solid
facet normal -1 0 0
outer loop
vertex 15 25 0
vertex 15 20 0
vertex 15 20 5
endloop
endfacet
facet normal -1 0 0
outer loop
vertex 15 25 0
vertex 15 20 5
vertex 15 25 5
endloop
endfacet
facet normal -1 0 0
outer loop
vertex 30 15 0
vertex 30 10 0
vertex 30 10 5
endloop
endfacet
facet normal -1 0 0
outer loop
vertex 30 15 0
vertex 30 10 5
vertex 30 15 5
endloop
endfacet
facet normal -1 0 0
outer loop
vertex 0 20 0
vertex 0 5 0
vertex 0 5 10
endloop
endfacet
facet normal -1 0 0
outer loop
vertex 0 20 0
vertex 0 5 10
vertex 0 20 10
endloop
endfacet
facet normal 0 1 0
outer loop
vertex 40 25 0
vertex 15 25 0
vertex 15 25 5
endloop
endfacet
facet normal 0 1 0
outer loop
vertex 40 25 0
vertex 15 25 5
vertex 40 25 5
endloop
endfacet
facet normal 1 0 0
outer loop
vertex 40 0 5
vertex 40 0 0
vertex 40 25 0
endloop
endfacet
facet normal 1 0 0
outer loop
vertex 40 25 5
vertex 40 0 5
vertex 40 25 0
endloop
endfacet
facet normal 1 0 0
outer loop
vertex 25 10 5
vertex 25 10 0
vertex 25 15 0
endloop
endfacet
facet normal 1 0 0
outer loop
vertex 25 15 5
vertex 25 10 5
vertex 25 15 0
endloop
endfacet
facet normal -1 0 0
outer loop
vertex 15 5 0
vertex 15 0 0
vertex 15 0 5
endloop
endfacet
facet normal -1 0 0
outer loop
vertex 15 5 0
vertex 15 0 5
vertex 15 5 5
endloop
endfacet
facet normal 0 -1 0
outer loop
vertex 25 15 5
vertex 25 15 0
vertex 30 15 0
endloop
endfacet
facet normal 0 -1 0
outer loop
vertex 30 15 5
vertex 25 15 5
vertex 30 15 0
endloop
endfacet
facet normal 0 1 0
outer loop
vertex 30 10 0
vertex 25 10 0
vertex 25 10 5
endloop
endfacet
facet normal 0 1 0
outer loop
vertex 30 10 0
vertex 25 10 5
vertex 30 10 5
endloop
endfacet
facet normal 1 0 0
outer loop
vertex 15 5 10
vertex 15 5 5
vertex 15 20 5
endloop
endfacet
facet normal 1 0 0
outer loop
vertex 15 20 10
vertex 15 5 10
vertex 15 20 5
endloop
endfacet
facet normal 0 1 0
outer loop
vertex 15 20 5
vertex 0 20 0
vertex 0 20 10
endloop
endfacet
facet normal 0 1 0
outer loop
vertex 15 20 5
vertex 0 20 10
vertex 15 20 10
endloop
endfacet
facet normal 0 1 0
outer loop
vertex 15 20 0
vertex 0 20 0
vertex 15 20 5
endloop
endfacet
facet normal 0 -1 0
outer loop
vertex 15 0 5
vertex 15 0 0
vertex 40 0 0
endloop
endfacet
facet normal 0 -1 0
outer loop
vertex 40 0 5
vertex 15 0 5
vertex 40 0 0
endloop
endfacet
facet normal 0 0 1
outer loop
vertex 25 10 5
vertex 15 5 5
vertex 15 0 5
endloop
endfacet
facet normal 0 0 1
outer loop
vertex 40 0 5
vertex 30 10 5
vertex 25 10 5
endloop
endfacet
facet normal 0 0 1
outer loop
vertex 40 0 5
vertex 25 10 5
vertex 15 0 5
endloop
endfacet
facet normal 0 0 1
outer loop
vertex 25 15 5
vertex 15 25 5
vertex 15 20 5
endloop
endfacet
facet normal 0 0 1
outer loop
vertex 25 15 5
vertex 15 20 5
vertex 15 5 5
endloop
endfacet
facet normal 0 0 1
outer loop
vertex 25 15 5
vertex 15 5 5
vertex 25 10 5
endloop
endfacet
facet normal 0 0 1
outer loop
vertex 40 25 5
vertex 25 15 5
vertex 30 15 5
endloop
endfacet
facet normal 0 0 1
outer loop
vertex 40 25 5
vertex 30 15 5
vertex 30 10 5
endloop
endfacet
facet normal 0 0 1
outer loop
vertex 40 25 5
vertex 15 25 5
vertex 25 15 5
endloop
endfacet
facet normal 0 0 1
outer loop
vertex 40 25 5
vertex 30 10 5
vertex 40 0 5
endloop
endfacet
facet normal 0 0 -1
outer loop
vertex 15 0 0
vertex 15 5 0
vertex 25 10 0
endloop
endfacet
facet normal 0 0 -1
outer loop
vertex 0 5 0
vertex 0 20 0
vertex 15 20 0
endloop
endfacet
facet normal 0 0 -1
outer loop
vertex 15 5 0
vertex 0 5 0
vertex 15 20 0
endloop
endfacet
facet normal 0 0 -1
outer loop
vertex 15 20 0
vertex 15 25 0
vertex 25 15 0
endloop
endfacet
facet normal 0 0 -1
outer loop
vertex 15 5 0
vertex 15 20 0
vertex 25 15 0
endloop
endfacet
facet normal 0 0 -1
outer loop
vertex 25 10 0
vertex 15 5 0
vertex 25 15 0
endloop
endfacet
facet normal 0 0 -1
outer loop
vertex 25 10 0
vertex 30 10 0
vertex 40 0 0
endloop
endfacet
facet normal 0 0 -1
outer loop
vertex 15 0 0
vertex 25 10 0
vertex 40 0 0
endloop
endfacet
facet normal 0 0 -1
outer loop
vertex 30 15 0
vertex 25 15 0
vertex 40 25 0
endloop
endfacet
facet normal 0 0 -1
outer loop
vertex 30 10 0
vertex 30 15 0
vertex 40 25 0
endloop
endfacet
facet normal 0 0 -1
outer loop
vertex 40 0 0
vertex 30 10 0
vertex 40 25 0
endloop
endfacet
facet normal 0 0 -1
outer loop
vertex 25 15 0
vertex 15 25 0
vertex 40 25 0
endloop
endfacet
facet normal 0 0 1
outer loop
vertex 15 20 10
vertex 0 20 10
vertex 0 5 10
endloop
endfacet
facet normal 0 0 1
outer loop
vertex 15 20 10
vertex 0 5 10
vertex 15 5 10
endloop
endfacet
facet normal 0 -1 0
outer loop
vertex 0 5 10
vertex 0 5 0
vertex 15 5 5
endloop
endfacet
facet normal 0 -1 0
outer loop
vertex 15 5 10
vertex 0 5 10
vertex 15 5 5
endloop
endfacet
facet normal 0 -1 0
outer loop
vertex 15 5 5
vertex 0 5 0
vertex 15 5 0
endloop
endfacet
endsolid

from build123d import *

# Parameters (mm, degrees)
BOX002_W     = 5
BOX002_H     = 5
BOX002_DEPTH = 10
BOX001_W     = 25
BOX001_H     = 25
BOX001_DEPTH = 5
BOX_W        = 15
BOX_H        = 15
BOX_DEPTH    = 10


with BuildPart() as cube002:
    # Box002 → Box002 (new body)
    with BuildSketch(Plane(origin=(25, 10, 0), x_dir=(1, 0, 0), z_dir=(0, 0, 1))):
        with Locations((2.5, 2.5)):
            Rectangle(BOX002_W, BOX002_H)
    extrude(amount=BOX002_DEPTH)


with BuildPart() as cut:
    # Box001 → Box001 (new body)
    with BuildSketch(Plane(origin=(15, 0, 0), x_dir=(1, 0, 0), z_dir=(0, 0, 1))):
        with Locations((12.5, 12.5)):
            Rectangle(BOX001_W, BOX001_H)
    extrude(amount=BOX001_DEPTH)

    # Cut: cut Cube002
    add(cube002.part, mode=Mode.SUBTRACT)


with BuildPart() as fusion:
    # Box → Box (new body)
    with BuildSketch(Plane(origin=(0, 5, 0), x_dir=(1, 0, 0), z_dir=(0, 0, 1))):
        with Locations((7.5, 7.5)):
            Rectangle(BOX_W, BOX_H)
    extrude(amount=BOX_DEPTH)

    # Fusion: union Cut
    add(cut.part)


solid = fusion.part
